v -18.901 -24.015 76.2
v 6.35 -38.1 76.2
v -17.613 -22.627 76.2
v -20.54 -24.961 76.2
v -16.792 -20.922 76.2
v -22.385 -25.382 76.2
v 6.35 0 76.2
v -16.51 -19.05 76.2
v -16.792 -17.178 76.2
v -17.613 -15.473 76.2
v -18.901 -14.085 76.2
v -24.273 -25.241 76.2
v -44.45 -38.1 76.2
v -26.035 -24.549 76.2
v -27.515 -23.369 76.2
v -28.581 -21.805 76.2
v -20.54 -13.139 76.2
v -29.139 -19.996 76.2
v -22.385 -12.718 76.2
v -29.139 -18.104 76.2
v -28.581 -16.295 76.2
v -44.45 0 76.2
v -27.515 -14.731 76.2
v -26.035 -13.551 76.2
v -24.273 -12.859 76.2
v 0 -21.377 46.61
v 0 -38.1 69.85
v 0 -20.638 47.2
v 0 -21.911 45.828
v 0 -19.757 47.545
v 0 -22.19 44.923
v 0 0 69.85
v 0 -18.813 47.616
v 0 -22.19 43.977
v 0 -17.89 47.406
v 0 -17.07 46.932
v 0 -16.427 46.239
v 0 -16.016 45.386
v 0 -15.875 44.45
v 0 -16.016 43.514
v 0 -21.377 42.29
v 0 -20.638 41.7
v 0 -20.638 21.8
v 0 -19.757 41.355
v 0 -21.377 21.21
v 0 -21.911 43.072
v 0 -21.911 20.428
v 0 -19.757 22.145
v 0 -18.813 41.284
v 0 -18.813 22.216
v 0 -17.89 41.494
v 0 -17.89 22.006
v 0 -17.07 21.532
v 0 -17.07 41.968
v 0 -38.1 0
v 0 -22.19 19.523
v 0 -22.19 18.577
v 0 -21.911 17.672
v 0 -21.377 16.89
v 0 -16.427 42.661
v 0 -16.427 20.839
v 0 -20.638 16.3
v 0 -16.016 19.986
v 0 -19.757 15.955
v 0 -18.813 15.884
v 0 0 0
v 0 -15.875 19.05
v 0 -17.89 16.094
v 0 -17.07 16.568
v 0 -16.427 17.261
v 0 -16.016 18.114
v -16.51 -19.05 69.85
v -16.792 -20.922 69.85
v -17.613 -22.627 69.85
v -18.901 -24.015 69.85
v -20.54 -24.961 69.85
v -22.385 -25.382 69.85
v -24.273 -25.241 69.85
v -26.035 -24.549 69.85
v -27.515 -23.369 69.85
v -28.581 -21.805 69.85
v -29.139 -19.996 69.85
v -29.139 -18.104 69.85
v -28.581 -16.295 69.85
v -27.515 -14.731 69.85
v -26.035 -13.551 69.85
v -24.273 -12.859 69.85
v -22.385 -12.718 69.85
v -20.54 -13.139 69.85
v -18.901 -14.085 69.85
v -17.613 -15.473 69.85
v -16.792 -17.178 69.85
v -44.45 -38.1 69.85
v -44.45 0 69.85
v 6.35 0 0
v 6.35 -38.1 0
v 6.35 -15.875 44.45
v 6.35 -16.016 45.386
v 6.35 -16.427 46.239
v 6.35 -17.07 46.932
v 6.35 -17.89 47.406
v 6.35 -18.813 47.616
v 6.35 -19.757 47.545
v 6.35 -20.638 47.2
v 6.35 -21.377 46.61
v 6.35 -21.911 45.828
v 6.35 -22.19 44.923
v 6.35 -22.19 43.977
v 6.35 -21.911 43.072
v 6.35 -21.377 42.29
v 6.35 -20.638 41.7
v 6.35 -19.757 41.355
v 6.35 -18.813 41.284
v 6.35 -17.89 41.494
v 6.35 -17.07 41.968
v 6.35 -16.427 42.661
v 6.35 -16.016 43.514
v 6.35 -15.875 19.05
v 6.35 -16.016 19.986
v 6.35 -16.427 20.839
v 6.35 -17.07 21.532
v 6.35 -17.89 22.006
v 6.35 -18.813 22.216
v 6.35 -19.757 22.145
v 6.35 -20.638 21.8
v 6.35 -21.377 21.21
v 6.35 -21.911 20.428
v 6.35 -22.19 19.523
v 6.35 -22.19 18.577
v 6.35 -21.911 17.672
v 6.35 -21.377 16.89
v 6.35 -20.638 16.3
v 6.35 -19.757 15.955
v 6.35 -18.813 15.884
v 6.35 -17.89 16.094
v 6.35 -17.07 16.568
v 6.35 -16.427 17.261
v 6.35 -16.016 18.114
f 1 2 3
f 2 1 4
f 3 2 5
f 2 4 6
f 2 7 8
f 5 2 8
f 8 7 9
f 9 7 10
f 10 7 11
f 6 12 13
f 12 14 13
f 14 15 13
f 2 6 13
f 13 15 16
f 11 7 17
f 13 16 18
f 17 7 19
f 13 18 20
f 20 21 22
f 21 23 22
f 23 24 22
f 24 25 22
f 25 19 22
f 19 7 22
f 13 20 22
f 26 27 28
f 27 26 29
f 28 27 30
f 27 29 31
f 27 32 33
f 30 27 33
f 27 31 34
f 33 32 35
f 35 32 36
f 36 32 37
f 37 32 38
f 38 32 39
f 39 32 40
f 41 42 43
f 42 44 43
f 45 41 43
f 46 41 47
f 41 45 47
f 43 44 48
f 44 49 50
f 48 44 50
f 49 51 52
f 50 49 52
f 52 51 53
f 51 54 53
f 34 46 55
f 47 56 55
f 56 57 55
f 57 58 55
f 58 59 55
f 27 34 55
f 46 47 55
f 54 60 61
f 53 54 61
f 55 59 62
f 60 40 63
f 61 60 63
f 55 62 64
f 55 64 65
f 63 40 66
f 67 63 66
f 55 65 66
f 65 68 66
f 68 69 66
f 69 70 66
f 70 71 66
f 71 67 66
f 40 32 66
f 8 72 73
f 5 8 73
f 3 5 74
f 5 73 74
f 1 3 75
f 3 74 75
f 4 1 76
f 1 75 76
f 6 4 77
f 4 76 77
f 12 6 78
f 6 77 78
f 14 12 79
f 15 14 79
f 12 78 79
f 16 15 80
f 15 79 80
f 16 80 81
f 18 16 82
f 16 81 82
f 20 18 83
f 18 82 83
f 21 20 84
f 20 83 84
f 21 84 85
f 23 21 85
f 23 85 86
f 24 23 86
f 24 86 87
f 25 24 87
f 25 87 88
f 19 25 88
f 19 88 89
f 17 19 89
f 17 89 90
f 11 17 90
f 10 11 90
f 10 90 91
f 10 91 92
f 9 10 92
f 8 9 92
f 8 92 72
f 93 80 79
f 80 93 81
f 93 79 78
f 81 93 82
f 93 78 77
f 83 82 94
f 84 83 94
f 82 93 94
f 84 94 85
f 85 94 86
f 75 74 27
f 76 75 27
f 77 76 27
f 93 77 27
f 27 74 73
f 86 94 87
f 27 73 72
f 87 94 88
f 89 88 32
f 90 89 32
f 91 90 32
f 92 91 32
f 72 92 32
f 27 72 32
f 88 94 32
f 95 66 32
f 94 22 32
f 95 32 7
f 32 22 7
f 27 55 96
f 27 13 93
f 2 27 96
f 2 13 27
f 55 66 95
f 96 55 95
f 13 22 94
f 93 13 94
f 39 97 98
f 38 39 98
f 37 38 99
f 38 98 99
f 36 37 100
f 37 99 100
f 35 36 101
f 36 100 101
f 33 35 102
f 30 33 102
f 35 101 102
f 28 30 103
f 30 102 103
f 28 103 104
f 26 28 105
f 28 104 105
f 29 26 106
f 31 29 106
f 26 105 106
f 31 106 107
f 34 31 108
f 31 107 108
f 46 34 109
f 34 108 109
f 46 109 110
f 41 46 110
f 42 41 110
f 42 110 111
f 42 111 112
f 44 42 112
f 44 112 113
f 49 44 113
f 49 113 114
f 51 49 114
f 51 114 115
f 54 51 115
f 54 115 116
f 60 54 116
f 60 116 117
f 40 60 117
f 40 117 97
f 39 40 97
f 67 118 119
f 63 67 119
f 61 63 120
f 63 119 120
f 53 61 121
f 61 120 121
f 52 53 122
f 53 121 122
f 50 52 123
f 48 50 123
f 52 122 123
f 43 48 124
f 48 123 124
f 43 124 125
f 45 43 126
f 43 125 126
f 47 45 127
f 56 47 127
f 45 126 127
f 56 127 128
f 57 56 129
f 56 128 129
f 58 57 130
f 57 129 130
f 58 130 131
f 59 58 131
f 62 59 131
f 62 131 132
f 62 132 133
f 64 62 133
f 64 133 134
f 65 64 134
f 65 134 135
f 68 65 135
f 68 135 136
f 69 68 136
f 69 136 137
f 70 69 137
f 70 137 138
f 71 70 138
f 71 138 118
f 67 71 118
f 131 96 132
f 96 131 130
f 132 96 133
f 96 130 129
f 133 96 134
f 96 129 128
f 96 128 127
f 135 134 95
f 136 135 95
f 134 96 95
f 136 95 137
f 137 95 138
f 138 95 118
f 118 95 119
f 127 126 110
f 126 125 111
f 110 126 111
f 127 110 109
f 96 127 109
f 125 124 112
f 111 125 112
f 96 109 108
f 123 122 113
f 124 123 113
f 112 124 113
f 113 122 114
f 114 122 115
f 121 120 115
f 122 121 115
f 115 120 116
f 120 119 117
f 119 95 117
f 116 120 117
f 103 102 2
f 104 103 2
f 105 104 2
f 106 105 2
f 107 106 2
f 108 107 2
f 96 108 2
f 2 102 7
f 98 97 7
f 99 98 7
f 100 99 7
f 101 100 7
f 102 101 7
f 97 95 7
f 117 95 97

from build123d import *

# Parameters (mm, degrees)
F1_DEPTH = 38.1
F2_R     = 3.175
F3_DEPTH = 25.4
F4_R     = 6.35
F5_DEPTH = 25.4


with BuildPart() as f1:
    # F0 (on Front) → F1 (new body)
    with BuildSketch(Plane.XZ):
        Polygon((0, 69.85), (0, 0), (6.35, 0), (6.35, 76.2), (-44.45, 76.2), (-44.45, 69.85), align=None)
    extrude(amount=F1_DEPTH)

    # F2 (on face) → F3 (cut)
    with BuildSketch(Plane.YZ.offset(6.35)):
        with Locations((-19.05, 44.45)):
            Circle(F2_R)
        with Locations((-19.05, 19.05)):
            Circle(F2_R)
    extrude(amount=-F3_DEPTH, mode=Mode.SUBTRACT)

    # F4 (on face) → F5 (cut)
    with BuildSketch(Plane(origin=(0, 0, 69.85), x_dir=(1, 0, 0), z_dir=(0, 0, -1))):
        with Locations((-22.86, 19.05)):
            Circle(F4_R)
    extrude(amount=-F5_DEPTH, mode=Mode.SUBTRACT)


solid = f1.part
